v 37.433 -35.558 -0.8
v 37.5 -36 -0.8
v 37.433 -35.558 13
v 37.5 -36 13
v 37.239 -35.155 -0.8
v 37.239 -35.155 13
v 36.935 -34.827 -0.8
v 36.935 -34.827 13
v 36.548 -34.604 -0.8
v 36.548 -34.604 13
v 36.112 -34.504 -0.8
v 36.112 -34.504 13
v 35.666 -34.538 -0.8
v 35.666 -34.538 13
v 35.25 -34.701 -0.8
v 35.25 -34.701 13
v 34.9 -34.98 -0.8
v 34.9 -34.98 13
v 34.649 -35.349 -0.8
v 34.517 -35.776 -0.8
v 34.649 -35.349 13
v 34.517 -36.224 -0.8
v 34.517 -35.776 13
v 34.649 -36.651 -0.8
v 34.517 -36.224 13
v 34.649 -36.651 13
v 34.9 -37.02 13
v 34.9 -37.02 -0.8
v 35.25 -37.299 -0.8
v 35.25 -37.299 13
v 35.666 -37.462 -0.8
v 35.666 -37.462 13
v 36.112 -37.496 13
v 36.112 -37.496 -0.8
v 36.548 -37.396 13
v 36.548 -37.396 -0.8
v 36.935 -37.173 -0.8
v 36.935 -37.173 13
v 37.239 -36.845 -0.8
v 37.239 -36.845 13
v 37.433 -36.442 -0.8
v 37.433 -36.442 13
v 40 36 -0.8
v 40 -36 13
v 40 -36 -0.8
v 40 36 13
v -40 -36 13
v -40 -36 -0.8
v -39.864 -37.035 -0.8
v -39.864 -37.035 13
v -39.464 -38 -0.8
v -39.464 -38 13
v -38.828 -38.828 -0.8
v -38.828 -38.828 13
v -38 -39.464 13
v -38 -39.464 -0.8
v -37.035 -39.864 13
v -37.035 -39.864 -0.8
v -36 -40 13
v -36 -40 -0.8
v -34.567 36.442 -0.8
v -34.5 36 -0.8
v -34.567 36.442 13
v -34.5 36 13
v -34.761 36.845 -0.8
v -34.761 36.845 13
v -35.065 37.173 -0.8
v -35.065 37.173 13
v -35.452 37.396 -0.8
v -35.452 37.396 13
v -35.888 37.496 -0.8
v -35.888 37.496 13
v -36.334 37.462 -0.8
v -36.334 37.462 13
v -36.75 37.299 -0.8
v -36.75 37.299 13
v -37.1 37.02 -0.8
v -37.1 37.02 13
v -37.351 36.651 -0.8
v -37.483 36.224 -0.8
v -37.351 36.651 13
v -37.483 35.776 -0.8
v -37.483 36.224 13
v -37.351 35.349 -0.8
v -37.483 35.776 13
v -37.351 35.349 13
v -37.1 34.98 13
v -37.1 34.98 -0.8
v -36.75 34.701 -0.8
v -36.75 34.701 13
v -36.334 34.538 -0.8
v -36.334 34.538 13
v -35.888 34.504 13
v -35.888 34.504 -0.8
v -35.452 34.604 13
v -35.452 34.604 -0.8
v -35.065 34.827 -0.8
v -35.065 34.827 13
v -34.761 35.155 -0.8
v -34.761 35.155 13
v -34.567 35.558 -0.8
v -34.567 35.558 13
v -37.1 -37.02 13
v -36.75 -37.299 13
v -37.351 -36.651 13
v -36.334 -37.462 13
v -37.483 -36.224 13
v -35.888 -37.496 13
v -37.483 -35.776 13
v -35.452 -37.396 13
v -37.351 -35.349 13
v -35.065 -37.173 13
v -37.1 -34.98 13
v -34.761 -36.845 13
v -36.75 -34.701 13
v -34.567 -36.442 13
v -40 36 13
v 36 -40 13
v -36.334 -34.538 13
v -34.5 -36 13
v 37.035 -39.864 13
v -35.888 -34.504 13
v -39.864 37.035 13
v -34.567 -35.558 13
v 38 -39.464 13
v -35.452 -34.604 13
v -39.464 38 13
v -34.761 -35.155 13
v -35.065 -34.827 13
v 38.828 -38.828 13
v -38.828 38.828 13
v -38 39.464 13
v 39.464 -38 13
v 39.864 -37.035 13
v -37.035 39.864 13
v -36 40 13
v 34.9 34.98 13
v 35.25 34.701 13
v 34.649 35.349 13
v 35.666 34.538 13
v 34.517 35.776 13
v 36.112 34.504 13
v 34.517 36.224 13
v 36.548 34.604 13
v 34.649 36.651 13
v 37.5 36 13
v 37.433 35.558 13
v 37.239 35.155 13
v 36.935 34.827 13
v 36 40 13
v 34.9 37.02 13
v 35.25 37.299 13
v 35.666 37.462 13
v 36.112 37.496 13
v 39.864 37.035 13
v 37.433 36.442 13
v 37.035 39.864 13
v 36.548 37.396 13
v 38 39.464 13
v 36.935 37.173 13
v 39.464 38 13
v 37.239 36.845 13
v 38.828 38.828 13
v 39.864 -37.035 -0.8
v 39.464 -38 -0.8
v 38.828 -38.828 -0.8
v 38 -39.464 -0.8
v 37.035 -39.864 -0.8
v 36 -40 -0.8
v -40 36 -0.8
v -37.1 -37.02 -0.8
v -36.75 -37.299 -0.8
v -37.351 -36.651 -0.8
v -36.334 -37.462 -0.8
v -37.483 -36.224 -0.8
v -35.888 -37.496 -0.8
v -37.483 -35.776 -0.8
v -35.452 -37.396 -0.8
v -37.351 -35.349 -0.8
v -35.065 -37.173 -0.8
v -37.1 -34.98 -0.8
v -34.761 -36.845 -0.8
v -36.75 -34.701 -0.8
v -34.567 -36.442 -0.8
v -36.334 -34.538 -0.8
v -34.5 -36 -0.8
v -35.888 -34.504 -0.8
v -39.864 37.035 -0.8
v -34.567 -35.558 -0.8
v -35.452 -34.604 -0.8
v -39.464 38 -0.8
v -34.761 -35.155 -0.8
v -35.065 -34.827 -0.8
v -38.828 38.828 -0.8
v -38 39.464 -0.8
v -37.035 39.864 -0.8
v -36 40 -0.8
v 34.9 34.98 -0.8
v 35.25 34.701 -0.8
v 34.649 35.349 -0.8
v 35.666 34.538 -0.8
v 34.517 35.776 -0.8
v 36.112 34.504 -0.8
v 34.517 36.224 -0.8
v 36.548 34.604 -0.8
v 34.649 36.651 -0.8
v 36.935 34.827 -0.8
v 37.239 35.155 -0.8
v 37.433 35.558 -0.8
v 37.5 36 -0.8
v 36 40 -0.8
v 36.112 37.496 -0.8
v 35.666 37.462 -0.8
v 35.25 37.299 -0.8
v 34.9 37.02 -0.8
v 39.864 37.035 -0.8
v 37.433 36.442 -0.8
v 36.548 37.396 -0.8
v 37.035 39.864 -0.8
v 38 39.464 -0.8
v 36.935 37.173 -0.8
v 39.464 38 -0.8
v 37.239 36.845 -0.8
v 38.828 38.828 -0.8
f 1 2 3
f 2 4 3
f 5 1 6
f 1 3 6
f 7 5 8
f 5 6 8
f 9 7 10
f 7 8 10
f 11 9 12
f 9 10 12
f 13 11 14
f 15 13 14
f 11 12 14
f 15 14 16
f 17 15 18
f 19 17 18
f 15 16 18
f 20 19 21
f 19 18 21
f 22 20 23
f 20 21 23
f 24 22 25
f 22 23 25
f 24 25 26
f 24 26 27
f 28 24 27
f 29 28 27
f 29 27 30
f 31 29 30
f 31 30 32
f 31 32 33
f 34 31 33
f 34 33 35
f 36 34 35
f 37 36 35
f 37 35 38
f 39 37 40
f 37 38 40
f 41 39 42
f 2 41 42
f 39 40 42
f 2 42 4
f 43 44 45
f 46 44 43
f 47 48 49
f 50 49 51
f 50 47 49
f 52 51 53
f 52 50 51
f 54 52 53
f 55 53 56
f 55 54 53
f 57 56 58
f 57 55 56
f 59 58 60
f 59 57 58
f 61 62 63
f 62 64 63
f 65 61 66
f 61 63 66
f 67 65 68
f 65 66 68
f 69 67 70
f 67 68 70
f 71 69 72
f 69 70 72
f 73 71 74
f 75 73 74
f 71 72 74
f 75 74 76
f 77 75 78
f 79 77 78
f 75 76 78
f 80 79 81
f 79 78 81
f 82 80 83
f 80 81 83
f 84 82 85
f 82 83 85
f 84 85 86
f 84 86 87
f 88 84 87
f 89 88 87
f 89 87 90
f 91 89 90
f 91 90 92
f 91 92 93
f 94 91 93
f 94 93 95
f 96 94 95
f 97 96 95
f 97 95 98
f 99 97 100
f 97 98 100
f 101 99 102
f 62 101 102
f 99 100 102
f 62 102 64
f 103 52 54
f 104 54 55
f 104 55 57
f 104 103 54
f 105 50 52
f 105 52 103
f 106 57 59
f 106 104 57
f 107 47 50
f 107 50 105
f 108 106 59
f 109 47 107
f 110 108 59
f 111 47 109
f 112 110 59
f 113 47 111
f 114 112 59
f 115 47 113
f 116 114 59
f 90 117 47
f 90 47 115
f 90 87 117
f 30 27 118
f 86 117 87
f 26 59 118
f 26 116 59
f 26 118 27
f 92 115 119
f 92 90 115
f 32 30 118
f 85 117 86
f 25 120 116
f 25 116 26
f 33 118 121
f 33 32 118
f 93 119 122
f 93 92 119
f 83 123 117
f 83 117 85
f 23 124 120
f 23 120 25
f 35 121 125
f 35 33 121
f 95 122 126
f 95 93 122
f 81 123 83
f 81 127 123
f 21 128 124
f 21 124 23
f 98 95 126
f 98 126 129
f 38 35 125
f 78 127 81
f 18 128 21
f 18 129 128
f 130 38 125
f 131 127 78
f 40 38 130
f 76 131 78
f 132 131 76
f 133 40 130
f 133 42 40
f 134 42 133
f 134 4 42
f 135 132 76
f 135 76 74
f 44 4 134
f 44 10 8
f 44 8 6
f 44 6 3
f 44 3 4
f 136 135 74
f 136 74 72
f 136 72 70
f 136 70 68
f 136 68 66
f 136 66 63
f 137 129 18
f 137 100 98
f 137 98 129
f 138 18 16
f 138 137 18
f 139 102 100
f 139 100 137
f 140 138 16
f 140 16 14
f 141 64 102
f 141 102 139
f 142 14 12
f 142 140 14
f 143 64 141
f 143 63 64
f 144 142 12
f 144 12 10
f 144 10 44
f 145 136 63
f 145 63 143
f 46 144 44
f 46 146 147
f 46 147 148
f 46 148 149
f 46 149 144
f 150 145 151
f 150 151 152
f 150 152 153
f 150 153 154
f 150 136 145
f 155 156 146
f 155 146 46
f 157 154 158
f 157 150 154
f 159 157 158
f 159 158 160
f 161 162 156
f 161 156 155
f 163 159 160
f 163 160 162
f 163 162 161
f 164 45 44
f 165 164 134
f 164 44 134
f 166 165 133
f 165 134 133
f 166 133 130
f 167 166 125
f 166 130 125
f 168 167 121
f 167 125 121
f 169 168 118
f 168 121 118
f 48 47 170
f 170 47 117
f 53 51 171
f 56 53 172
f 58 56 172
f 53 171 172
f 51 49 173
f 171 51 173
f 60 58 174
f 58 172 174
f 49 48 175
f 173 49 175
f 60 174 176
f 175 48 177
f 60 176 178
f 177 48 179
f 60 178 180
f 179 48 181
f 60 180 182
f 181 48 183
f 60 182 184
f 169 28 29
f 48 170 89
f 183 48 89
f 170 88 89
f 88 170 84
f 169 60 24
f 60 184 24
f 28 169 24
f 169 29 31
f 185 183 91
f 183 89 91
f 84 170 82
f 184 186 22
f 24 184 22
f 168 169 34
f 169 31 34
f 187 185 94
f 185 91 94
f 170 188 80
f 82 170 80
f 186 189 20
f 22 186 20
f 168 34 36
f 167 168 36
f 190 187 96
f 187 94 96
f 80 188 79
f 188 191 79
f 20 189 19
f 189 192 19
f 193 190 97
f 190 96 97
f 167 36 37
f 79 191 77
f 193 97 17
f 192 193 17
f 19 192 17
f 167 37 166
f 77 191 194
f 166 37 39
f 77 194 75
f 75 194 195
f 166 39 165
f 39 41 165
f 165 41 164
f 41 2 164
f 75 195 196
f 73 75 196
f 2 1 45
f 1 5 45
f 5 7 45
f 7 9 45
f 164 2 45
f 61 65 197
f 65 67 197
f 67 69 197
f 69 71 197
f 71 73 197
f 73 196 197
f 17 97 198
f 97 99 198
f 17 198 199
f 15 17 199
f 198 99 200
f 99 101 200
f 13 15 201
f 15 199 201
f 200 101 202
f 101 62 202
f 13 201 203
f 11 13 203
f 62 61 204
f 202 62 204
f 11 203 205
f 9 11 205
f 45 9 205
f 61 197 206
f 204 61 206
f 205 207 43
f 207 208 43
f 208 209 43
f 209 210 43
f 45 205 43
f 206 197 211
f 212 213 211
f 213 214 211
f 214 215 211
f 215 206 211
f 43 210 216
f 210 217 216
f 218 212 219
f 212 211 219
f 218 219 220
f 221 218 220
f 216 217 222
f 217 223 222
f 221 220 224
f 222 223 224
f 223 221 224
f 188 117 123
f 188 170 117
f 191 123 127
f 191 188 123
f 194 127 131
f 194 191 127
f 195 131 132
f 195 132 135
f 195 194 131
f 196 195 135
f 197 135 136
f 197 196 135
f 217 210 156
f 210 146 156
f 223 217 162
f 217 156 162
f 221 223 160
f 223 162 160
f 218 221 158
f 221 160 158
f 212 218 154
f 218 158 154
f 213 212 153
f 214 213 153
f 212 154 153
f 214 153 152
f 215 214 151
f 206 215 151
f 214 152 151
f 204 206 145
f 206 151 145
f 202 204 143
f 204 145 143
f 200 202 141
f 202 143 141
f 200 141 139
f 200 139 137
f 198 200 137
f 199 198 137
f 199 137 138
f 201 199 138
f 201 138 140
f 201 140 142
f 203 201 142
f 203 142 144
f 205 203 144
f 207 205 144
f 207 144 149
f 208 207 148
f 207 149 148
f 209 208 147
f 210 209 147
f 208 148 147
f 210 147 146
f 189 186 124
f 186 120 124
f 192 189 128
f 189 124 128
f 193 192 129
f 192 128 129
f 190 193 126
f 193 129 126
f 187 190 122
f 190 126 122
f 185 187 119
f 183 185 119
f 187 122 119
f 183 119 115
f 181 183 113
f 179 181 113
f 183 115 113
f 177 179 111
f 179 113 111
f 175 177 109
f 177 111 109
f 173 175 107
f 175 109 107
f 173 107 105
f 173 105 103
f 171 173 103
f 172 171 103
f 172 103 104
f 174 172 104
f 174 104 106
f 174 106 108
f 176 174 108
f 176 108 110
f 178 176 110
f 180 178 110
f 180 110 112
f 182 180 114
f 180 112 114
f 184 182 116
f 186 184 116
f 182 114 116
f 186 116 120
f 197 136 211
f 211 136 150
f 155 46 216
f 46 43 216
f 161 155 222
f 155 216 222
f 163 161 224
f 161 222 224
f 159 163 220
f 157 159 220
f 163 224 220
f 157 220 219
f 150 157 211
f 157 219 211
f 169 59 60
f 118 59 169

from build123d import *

# Parameters (mm, degrees)
SKETCH109_W          = 80
SKETCH109_H          = 80
PAD_DEPTH            = 13
PAD_DEPTH_BACK       = 0.8
FILLET059_R          = 4
SKETCH110_R          = 1.5
POCKET055_DEPTH      = 0.801
POCKET055_DEPTH_BACK = 13.001


with BuildPart() as part:
    # Sketch109 → Pad (new body, two sides)
    with BuildSketch(Plane.XY) as pad_sk:
        Rectangle(SKETCH109_W, SKETCH109_H)
    extrude(amount=PAD_DEPTH)
    extrude(pad_sk.sketch, amount=-PAD_DEPTH_BACK)

    # Fillet059
    fillet059_edges = [part.edges().sort_by_distance(p)[0] for p in [
        (-40, 40, 6.1),
        (-40, -40, 6.1),
        (40, -40, 6.1),
        (40, 40, 6.1),
    ]]
    fillet(fillet059_edges, radius=FILLET059_R)

    # Sketch110 → Pocket055 (cut, two sides)
    with BuildSketch(Plane.XY) as pocket055_sk:
        with Locations((-36, 36)):
            Circle(SKETCH110_R)
        with Locations((36, 36)):
            Circle(SKETCH110_R)
        with Locations((36, -36)):
            Circle(SKETCH110_R)
        with Locations((-36, -36)):
            Circle(SKETCH110_R)
    extrude(amount=-POCKET055_DEPTH, mode=Mode.SUBTRACT)
    extrude(pocket055_sk.sketch, amount=POCKET055_DEPTH_BACK, mode=Mode.SUBTRACT)


solid = part.part
